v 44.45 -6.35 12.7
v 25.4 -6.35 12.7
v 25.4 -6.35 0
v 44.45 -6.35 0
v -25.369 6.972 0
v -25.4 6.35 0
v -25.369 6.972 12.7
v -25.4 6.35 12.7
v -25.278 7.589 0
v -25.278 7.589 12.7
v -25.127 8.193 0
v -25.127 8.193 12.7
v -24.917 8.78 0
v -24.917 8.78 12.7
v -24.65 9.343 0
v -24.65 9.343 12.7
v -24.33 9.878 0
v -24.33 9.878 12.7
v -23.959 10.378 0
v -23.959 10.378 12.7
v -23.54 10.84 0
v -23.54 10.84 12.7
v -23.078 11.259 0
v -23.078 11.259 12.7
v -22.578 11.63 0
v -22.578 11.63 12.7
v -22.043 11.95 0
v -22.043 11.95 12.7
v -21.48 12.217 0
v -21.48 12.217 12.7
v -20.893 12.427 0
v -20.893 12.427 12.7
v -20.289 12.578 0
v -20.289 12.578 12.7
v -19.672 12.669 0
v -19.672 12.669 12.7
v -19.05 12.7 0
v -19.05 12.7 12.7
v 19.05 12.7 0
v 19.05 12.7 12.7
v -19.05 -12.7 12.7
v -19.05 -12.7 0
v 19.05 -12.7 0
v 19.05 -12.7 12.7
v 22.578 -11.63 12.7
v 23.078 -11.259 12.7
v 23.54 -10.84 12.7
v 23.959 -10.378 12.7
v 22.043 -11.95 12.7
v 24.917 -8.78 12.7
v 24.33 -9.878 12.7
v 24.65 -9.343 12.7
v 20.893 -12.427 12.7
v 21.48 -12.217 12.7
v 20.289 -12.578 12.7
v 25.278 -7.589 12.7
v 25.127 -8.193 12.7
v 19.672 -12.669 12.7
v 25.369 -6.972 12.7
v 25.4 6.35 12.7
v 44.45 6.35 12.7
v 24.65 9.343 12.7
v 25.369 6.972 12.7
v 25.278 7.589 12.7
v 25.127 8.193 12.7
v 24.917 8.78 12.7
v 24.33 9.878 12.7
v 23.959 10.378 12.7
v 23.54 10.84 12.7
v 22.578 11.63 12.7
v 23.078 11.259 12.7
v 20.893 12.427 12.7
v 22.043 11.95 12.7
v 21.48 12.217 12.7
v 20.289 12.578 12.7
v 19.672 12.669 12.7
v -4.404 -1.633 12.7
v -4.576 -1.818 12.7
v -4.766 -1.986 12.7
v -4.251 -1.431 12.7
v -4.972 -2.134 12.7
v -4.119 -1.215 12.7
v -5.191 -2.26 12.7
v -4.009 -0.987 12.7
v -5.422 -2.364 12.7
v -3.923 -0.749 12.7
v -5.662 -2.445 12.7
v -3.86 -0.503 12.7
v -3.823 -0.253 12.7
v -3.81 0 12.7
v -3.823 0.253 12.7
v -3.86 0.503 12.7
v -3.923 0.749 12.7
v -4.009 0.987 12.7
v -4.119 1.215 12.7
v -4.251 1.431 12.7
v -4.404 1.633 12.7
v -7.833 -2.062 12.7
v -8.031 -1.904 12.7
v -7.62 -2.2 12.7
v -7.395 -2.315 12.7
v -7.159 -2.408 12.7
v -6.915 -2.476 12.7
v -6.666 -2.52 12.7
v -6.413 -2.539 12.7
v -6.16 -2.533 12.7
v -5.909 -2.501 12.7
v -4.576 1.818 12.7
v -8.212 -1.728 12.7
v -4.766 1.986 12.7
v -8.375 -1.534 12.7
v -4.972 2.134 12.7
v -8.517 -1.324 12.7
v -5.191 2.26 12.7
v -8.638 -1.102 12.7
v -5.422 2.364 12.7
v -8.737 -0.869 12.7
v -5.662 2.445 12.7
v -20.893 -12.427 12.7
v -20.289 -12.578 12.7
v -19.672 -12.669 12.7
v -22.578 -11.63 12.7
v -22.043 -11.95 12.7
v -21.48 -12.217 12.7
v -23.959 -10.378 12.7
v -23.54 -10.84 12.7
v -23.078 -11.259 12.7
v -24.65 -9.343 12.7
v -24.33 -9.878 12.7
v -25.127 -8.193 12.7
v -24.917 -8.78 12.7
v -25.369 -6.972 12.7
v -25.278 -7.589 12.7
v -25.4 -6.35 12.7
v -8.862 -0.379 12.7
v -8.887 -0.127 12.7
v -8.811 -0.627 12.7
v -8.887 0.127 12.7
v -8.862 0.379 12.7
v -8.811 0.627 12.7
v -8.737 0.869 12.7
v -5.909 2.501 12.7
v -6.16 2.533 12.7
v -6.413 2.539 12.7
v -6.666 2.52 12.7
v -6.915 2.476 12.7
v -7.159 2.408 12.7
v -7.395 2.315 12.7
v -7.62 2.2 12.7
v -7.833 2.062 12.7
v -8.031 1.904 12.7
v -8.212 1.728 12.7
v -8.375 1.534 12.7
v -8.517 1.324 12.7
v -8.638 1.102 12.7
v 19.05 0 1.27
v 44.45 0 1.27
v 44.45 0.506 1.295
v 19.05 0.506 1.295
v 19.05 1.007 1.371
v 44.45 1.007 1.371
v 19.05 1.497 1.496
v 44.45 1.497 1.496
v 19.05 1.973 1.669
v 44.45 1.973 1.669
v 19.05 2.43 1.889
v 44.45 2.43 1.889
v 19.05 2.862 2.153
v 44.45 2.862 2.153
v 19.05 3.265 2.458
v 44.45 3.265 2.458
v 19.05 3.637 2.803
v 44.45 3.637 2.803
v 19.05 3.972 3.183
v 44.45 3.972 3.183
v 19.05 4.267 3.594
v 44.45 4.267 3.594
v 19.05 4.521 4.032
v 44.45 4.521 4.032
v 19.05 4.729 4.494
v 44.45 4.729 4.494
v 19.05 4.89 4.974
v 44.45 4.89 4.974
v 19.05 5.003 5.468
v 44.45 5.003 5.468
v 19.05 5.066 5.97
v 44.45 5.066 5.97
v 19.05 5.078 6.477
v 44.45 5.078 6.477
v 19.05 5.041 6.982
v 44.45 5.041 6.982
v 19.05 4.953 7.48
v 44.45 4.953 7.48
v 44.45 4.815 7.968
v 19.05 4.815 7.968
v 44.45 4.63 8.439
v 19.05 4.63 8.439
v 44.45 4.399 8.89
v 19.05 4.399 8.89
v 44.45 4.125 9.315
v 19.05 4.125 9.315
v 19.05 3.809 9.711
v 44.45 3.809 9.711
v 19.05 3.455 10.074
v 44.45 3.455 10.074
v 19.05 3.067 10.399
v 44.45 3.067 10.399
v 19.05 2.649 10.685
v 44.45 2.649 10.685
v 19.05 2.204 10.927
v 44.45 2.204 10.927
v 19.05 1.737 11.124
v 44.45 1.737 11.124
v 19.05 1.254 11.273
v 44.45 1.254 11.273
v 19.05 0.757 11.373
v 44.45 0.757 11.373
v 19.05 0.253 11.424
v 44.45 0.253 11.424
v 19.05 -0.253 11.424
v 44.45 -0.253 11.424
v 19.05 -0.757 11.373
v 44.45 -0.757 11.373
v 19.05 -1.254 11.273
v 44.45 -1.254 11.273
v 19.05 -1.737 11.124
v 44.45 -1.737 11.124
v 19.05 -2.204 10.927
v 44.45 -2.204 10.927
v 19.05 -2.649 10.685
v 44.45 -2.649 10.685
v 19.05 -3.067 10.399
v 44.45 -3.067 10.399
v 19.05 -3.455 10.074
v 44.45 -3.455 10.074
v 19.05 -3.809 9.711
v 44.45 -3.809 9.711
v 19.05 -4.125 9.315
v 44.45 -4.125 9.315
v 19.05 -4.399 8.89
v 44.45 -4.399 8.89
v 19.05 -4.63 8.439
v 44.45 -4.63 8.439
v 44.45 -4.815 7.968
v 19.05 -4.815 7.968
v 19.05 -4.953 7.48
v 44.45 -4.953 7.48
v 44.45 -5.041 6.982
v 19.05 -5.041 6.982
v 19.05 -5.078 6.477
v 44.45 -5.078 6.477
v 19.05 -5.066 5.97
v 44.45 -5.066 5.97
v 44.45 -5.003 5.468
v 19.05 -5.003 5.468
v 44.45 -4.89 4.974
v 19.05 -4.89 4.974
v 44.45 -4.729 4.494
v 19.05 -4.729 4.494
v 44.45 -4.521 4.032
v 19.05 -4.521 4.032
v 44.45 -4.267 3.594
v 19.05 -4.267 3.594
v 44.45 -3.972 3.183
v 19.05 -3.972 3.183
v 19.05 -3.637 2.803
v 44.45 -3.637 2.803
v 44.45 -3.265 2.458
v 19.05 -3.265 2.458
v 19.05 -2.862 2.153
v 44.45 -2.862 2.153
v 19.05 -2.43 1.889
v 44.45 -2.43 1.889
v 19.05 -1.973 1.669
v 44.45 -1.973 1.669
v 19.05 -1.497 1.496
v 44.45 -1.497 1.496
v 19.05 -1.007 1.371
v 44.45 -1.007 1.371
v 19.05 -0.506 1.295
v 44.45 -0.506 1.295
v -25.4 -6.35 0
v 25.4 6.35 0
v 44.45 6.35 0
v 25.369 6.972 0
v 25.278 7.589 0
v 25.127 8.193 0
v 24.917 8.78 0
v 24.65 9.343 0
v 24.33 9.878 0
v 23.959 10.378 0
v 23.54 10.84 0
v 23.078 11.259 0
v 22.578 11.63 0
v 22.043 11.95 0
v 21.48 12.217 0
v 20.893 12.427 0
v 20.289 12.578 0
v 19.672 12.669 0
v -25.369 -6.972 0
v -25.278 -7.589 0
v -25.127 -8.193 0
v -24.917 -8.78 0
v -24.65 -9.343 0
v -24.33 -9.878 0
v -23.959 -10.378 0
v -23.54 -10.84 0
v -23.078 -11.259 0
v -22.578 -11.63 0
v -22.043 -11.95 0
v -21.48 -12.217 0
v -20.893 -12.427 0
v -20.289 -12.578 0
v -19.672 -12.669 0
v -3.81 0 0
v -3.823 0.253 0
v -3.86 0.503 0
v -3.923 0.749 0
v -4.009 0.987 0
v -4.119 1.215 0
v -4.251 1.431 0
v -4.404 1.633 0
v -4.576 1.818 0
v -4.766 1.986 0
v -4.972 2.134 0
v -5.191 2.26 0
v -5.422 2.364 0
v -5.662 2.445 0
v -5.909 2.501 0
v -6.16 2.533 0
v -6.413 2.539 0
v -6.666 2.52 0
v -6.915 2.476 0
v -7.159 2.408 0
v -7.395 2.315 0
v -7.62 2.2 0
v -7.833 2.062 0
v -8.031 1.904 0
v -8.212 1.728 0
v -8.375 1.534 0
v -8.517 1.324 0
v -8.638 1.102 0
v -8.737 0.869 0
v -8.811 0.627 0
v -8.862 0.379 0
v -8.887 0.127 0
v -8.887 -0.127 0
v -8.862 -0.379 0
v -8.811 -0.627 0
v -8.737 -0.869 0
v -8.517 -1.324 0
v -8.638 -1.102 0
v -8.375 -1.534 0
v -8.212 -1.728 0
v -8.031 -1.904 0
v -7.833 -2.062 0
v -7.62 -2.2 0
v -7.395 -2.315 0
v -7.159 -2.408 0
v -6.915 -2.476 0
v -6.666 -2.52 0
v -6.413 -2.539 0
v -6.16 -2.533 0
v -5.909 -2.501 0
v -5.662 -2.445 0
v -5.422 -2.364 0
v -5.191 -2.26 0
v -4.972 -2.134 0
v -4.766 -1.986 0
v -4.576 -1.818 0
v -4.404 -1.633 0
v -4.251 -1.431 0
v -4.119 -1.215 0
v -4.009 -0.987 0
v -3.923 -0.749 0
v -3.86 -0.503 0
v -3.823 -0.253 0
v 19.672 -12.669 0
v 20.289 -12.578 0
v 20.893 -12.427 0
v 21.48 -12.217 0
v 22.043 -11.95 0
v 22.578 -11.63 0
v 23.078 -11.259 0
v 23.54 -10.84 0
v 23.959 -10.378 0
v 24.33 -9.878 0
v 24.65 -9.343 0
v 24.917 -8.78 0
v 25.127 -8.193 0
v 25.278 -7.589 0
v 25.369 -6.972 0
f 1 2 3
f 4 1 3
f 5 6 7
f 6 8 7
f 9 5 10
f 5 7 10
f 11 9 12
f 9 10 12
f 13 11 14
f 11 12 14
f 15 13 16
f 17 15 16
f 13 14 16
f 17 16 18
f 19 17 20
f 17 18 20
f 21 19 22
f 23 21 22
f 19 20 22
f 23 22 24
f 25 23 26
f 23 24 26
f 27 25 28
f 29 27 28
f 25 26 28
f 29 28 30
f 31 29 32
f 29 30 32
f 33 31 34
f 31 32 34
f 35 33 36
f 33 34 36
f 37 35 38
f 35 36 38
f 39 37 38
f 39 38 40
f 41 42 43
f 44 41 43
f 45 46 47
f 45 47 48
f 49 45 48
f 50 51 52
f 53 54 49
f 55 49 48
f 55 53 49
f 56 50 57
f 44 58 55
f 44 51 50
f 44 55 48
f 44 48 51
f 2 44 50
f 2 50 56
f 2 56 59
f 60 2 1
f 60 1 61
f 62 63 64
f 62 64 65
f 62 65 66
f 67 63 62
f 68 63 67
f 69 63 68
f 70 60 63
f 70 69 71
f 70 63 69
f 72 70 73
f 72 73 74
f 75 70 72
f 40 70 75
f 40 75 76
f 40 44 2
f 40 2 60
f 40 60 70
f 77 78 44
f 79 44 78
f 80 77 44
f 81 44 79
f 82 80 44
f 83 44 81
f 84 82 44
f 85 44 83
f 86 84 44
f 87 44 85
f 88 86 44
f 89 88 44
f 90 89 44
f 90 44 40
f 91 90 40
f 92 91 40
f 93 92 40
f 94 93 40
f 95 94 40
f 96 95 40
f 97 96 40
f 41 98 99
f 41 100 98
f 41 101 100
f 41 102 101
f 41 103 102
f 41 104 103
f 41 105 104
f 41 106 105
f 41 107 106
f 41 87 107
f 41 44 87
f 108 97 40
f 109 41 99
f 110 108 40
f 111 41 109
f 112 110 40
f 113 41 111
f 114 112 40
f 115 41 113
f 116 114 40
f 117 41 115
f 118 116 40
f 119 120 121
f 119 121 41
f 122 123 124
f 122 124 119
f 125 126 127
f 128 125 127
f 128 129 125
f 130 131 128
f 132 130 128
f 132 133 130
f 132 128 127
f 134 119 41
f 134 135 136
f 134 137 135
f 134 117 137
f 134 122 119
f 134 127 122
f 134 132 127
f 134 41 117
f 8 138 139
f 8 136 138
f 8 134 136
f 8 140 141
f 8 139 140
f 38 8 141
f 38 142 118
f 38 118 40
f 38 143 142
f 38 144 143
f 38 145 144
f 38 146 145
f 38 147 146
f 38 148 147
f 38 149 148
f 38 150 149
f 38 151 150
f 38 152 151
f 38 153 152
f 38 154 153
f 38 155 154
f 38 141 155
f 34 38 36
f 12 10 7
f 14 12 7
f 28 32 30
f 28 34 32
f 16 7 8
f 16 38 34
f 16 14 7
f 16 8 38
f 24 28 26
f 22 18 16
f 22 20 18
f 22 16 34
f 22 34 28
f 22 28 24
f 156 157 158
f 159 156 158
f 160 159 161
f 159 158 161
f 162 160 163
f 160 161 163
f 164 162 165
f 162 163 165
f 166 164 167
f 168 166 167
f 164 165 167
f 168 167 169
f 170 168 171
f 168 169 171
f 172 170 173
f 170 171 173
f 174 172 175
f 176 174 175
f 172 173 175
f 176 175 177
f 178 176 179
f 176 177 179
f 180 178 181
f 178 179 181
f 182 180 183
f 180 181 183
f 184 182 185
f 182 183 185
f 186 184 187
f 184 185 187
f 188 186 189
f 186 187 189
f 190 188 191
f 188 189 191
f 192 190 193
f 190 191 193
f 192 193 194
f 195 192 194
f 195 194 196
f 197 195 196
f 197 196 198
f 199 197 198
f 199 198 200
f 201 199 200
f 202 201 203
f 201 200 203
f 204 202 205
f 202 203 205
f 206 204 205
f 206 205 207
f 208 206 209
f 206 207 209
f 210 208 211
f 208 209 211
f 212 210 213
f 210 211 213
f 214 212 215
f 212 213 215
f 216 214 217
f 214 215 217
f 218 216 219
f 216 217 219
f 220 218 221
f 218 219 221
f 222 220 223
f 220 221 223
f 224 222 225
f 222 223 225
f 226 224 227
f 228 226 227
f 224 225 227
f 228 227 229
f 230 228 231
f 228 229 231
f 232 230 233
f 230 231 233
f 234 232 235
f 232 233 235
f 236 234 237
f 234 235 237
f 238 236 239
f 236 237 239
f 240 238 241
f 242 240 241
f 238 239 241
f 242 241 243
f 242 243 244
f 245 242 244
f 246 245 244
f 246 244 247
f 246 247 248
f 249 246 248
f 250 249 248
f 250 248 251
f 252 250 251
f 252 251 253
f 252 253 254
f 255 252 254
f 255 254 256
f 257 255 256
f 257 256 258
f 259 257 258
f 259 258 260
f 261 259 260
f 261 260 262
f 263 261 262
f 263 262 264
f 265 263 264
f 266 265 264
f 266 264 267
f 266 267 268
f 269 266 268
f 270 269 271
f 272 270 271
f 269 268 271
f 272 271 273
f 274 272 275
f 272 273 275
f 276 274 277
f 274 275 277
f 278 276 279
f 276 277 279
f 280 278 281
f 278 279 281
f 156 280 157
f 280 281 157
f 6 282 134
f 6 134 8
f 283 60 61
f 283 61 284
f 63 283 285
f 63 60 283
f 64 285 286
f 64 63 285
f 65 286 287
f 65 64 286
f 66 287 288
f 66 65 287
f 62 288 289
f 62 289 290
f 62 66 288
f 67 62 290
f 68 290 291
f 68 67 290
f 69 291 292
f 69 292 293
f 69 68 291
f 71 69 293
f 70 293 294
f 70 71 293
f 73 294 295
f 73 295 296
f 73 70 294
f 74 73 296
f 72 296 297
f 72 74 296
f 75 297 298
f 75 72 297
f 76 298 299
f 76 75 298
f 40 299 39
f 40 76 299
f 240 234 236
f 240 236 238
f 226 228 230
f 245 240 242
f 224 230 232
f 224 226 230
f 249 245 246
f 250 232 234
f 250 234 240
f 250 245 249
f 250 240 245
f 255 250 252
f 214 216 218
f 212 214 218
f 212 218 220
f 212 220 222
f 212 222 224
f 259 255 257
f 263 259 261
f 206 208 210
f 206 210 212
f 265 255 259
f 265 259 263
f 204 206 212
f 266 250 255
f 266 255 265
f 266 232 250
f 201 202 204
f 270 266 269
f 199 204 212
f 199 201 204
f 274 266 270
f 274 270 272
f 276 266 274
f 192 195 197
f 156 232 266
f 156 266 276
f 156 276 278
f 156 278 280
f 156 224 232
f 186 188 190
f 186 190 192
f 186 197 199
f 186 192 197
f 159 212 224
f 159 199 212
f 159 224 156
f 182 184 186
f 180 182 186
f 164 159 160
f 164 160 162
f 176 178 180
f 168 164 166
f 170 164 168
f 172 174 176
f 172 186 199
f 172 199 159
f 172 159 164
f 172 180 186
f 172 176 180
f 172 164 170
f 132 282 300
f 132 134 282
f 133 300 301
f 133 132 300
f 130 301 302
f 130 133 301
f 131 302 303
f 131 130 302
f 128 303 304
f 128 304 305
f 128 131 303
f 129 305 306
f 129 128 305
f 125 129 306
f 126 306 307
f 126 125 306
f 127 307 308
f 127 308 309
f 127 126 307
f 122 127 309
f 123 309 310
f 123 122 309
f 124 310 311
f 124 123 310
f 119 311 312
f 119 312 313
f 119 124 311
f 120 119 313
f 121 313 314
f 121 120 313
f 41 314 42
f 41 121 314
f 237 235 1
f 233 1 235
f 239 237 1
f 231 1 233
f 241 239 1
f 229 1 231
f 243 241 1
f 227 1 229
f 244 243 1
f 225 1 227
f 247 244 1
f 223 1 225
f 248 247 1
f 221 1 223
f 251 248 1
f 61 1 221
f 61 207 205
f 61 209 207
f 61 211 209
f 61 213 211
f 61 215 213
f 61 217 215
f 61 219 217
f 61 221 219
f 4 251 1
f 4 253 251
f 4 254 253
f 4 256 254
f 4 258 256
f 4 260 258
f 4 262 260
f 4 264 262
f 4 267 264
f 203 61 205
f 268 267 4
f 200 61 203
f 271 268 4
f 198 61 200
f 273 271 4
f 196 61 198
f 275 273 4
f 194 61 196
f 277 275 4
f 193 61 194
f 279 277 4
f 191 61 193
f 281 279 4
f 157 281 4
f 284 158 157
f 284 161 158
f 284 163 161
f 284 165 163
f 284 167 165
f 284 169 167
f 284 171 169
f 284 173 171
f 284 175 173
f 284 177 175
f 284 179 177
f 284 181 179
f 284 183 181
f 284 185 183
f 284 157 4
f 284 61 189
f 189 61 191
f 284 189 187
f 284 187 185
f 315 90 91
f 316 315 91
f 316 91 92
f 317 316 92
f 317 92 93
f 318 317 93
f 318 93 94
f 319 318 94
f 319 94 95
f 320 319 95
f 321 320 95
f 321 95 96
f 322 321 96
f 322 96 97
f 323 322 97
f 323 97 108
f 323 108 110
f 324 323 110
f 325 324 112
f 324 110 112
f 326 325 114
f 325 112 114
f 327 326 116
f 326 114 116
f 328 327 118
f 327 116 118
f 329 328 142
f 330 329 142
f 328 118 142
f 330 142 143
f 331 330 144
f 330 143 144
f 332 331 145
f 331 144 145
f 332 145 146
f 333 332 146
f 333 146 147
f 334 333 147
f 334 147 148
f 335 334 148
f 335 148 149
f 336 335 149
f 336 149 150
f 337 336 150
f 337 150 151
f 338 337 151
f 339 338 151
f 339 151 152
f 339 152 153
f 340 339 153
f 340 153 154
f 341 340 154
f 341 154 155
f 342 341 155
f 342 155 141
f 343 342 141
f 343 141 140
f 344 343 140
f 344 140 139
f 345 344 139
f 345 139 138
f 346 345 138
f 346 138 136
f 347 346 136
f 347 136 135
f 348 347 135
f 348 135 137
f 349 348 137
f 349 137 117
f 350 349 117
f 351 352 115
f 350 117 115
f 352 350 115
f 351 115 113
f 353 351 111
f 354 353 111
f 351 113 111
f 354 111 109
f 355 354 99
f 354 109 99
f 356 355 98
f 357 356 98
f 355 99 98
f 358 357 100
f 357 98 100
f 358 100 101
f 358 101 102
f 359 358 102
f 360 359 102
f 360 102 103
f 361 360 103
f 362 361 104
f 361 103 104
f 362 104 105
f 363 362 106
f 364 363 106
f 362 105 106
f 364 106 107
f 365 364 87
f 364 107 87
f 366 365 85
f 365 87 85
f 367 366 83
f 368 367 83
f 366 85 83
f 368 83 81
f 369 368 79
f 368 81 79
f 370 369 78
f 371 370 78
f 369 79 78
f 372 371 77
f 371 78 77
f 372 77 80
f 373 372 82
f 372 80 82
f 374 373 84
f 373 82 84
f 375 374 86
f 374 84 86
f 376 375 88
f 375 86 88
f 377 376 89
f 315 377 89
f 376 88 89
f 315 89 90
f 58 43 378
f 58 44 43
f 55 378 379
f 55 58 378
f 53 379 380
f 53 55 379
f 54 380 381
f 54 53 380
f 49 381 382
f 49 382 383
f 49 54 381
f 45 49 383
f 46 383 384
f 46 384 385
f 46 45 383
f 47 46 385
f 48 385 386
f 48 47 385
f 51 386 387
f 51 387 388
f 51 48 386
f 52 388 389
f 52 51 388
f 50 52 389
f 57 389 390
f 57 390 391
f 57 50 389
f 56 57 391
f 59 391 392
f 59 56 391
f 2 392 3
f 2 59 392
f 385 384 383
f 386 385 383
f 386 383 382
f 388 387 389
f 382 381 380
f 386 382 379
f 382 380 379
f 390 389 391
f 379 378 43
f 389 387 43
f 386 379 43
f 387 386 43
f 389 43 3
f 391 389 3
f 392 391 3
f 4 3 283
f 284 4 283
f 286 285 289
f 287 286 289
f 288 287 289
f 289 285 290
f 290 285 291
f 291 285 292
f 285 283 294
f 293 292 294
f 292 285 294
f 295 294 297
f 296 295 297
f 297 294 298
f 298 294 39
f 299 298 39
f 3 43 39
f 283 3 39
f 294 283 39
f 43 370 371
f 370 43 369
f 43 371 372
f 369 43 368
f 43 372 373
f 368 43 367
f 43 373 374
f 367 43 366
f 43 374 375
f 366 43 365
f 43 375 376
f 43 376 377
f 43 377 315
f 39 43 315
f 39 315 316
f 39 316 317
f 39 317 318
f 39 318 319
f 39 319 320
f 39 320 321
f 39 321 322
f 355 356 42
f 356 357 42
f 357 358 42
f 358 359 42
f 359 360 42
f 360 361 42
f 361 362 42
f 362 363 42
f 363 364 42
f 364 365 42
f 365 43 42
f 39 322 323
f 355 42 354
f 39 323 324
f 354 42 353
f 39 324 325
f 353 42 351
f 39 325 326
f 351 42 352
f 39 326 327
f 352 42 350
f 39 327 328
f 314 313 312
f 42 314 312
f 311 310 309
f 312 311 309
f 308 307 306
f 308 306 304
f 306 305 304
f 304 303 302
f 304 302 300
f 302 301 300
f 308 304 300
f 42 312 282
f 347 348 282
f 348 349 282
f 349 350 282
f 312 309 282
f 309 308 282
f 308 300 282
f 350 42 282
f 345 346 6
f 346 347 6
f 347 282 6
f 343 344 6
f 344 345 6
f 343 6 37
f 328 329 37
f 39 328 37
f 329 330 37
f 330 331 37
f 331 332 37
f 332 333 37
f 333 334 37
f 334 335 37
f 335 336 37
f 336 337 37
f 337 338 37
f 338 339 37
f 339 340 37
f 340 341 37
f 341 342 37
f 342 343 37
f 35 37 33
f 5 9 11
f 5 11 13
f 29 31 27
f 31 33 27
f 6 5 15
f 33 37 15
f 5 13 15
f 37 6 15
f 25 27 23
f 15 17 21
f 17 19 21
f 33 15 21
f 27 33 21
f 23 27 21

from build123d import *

# Parameters (mm, degrees)
SKETCH2_W           = 50.8
SKETCH2_H           = 25.4
BOSS_EXTRUDE1_DEPTH = 12.7
FILLET1_R           = 6.35
SKETCH3_R           = 2.54
CUT_EXTRUDE1_DEPTH  = 32.108519733
SKETCH4_W           = 12.7
SKETCH4_H           = 12.7
BOSS_EXTRUDE2_DEPTH = 19.05
SKETCH5_R           = 5.08
CUT_EXTRUDE2_DEPTH  = 25.4


with BuildPart() as part:
    # Sketch2 → Boss-Extrude1 (new body)
    with BuildSketch(Plane.XY):
        Rectangle(SKETCH2_W, SKETCH2_H)
    extrude(amount=BOSS_EXTRUDE1_DEPTH)

    # Fillet1
    fillet1_edges = [part.edges().sort_by_distance(p)[0] for p in [
        (-25.4, 12.7, 6.35),
        (25.4, 12.7, 6.35),
        (25.4, -12.7, 6.35),
        (-25.4, -12.7, 6.35),
    ]]
    fillet(fillet1_edges, radius=FILLET1_R)

    # Sketch3 → Cut-Extrude1 (cut, through all)
    with BuildSketch(Plane.XY.offset(12.7)):
        with Locations((-6.35, 0)):
            Circle(SKETCH3_R)
    extrude(amount=-CUT_EXTRUDE1_DEPTH, mode=Mode.SUBTRACT)

    # Sketch4 → Boss-Extrude2 (add)
    with BuildSketch(Plane(origin=(25.4, 0, 0), x_dir=(0, 0, -1), z_dir=(1, 0, 0))):
        with Locations((-6.35, 0)):
            Rectangle(SKETCH4_W, SKETCH4_H)
    extrude(amount=BOSS_EXTRUDE2_DEPTH)

    # Sketch5 → Cut-Extrude2 (cut)
    with BuildSketch(Plane(origin=(44.45, 0, 0), x_dir=(0, 0, -1), z_dir=(1, 0, 0))):
        with Locations((-6.35, 0)):
            Circle(SKETCH5_R)
    extrude(amount=-CUT_EXTRUDE2_DEPTH, mode=Mode.SUBTRACT)


solid = part.part
